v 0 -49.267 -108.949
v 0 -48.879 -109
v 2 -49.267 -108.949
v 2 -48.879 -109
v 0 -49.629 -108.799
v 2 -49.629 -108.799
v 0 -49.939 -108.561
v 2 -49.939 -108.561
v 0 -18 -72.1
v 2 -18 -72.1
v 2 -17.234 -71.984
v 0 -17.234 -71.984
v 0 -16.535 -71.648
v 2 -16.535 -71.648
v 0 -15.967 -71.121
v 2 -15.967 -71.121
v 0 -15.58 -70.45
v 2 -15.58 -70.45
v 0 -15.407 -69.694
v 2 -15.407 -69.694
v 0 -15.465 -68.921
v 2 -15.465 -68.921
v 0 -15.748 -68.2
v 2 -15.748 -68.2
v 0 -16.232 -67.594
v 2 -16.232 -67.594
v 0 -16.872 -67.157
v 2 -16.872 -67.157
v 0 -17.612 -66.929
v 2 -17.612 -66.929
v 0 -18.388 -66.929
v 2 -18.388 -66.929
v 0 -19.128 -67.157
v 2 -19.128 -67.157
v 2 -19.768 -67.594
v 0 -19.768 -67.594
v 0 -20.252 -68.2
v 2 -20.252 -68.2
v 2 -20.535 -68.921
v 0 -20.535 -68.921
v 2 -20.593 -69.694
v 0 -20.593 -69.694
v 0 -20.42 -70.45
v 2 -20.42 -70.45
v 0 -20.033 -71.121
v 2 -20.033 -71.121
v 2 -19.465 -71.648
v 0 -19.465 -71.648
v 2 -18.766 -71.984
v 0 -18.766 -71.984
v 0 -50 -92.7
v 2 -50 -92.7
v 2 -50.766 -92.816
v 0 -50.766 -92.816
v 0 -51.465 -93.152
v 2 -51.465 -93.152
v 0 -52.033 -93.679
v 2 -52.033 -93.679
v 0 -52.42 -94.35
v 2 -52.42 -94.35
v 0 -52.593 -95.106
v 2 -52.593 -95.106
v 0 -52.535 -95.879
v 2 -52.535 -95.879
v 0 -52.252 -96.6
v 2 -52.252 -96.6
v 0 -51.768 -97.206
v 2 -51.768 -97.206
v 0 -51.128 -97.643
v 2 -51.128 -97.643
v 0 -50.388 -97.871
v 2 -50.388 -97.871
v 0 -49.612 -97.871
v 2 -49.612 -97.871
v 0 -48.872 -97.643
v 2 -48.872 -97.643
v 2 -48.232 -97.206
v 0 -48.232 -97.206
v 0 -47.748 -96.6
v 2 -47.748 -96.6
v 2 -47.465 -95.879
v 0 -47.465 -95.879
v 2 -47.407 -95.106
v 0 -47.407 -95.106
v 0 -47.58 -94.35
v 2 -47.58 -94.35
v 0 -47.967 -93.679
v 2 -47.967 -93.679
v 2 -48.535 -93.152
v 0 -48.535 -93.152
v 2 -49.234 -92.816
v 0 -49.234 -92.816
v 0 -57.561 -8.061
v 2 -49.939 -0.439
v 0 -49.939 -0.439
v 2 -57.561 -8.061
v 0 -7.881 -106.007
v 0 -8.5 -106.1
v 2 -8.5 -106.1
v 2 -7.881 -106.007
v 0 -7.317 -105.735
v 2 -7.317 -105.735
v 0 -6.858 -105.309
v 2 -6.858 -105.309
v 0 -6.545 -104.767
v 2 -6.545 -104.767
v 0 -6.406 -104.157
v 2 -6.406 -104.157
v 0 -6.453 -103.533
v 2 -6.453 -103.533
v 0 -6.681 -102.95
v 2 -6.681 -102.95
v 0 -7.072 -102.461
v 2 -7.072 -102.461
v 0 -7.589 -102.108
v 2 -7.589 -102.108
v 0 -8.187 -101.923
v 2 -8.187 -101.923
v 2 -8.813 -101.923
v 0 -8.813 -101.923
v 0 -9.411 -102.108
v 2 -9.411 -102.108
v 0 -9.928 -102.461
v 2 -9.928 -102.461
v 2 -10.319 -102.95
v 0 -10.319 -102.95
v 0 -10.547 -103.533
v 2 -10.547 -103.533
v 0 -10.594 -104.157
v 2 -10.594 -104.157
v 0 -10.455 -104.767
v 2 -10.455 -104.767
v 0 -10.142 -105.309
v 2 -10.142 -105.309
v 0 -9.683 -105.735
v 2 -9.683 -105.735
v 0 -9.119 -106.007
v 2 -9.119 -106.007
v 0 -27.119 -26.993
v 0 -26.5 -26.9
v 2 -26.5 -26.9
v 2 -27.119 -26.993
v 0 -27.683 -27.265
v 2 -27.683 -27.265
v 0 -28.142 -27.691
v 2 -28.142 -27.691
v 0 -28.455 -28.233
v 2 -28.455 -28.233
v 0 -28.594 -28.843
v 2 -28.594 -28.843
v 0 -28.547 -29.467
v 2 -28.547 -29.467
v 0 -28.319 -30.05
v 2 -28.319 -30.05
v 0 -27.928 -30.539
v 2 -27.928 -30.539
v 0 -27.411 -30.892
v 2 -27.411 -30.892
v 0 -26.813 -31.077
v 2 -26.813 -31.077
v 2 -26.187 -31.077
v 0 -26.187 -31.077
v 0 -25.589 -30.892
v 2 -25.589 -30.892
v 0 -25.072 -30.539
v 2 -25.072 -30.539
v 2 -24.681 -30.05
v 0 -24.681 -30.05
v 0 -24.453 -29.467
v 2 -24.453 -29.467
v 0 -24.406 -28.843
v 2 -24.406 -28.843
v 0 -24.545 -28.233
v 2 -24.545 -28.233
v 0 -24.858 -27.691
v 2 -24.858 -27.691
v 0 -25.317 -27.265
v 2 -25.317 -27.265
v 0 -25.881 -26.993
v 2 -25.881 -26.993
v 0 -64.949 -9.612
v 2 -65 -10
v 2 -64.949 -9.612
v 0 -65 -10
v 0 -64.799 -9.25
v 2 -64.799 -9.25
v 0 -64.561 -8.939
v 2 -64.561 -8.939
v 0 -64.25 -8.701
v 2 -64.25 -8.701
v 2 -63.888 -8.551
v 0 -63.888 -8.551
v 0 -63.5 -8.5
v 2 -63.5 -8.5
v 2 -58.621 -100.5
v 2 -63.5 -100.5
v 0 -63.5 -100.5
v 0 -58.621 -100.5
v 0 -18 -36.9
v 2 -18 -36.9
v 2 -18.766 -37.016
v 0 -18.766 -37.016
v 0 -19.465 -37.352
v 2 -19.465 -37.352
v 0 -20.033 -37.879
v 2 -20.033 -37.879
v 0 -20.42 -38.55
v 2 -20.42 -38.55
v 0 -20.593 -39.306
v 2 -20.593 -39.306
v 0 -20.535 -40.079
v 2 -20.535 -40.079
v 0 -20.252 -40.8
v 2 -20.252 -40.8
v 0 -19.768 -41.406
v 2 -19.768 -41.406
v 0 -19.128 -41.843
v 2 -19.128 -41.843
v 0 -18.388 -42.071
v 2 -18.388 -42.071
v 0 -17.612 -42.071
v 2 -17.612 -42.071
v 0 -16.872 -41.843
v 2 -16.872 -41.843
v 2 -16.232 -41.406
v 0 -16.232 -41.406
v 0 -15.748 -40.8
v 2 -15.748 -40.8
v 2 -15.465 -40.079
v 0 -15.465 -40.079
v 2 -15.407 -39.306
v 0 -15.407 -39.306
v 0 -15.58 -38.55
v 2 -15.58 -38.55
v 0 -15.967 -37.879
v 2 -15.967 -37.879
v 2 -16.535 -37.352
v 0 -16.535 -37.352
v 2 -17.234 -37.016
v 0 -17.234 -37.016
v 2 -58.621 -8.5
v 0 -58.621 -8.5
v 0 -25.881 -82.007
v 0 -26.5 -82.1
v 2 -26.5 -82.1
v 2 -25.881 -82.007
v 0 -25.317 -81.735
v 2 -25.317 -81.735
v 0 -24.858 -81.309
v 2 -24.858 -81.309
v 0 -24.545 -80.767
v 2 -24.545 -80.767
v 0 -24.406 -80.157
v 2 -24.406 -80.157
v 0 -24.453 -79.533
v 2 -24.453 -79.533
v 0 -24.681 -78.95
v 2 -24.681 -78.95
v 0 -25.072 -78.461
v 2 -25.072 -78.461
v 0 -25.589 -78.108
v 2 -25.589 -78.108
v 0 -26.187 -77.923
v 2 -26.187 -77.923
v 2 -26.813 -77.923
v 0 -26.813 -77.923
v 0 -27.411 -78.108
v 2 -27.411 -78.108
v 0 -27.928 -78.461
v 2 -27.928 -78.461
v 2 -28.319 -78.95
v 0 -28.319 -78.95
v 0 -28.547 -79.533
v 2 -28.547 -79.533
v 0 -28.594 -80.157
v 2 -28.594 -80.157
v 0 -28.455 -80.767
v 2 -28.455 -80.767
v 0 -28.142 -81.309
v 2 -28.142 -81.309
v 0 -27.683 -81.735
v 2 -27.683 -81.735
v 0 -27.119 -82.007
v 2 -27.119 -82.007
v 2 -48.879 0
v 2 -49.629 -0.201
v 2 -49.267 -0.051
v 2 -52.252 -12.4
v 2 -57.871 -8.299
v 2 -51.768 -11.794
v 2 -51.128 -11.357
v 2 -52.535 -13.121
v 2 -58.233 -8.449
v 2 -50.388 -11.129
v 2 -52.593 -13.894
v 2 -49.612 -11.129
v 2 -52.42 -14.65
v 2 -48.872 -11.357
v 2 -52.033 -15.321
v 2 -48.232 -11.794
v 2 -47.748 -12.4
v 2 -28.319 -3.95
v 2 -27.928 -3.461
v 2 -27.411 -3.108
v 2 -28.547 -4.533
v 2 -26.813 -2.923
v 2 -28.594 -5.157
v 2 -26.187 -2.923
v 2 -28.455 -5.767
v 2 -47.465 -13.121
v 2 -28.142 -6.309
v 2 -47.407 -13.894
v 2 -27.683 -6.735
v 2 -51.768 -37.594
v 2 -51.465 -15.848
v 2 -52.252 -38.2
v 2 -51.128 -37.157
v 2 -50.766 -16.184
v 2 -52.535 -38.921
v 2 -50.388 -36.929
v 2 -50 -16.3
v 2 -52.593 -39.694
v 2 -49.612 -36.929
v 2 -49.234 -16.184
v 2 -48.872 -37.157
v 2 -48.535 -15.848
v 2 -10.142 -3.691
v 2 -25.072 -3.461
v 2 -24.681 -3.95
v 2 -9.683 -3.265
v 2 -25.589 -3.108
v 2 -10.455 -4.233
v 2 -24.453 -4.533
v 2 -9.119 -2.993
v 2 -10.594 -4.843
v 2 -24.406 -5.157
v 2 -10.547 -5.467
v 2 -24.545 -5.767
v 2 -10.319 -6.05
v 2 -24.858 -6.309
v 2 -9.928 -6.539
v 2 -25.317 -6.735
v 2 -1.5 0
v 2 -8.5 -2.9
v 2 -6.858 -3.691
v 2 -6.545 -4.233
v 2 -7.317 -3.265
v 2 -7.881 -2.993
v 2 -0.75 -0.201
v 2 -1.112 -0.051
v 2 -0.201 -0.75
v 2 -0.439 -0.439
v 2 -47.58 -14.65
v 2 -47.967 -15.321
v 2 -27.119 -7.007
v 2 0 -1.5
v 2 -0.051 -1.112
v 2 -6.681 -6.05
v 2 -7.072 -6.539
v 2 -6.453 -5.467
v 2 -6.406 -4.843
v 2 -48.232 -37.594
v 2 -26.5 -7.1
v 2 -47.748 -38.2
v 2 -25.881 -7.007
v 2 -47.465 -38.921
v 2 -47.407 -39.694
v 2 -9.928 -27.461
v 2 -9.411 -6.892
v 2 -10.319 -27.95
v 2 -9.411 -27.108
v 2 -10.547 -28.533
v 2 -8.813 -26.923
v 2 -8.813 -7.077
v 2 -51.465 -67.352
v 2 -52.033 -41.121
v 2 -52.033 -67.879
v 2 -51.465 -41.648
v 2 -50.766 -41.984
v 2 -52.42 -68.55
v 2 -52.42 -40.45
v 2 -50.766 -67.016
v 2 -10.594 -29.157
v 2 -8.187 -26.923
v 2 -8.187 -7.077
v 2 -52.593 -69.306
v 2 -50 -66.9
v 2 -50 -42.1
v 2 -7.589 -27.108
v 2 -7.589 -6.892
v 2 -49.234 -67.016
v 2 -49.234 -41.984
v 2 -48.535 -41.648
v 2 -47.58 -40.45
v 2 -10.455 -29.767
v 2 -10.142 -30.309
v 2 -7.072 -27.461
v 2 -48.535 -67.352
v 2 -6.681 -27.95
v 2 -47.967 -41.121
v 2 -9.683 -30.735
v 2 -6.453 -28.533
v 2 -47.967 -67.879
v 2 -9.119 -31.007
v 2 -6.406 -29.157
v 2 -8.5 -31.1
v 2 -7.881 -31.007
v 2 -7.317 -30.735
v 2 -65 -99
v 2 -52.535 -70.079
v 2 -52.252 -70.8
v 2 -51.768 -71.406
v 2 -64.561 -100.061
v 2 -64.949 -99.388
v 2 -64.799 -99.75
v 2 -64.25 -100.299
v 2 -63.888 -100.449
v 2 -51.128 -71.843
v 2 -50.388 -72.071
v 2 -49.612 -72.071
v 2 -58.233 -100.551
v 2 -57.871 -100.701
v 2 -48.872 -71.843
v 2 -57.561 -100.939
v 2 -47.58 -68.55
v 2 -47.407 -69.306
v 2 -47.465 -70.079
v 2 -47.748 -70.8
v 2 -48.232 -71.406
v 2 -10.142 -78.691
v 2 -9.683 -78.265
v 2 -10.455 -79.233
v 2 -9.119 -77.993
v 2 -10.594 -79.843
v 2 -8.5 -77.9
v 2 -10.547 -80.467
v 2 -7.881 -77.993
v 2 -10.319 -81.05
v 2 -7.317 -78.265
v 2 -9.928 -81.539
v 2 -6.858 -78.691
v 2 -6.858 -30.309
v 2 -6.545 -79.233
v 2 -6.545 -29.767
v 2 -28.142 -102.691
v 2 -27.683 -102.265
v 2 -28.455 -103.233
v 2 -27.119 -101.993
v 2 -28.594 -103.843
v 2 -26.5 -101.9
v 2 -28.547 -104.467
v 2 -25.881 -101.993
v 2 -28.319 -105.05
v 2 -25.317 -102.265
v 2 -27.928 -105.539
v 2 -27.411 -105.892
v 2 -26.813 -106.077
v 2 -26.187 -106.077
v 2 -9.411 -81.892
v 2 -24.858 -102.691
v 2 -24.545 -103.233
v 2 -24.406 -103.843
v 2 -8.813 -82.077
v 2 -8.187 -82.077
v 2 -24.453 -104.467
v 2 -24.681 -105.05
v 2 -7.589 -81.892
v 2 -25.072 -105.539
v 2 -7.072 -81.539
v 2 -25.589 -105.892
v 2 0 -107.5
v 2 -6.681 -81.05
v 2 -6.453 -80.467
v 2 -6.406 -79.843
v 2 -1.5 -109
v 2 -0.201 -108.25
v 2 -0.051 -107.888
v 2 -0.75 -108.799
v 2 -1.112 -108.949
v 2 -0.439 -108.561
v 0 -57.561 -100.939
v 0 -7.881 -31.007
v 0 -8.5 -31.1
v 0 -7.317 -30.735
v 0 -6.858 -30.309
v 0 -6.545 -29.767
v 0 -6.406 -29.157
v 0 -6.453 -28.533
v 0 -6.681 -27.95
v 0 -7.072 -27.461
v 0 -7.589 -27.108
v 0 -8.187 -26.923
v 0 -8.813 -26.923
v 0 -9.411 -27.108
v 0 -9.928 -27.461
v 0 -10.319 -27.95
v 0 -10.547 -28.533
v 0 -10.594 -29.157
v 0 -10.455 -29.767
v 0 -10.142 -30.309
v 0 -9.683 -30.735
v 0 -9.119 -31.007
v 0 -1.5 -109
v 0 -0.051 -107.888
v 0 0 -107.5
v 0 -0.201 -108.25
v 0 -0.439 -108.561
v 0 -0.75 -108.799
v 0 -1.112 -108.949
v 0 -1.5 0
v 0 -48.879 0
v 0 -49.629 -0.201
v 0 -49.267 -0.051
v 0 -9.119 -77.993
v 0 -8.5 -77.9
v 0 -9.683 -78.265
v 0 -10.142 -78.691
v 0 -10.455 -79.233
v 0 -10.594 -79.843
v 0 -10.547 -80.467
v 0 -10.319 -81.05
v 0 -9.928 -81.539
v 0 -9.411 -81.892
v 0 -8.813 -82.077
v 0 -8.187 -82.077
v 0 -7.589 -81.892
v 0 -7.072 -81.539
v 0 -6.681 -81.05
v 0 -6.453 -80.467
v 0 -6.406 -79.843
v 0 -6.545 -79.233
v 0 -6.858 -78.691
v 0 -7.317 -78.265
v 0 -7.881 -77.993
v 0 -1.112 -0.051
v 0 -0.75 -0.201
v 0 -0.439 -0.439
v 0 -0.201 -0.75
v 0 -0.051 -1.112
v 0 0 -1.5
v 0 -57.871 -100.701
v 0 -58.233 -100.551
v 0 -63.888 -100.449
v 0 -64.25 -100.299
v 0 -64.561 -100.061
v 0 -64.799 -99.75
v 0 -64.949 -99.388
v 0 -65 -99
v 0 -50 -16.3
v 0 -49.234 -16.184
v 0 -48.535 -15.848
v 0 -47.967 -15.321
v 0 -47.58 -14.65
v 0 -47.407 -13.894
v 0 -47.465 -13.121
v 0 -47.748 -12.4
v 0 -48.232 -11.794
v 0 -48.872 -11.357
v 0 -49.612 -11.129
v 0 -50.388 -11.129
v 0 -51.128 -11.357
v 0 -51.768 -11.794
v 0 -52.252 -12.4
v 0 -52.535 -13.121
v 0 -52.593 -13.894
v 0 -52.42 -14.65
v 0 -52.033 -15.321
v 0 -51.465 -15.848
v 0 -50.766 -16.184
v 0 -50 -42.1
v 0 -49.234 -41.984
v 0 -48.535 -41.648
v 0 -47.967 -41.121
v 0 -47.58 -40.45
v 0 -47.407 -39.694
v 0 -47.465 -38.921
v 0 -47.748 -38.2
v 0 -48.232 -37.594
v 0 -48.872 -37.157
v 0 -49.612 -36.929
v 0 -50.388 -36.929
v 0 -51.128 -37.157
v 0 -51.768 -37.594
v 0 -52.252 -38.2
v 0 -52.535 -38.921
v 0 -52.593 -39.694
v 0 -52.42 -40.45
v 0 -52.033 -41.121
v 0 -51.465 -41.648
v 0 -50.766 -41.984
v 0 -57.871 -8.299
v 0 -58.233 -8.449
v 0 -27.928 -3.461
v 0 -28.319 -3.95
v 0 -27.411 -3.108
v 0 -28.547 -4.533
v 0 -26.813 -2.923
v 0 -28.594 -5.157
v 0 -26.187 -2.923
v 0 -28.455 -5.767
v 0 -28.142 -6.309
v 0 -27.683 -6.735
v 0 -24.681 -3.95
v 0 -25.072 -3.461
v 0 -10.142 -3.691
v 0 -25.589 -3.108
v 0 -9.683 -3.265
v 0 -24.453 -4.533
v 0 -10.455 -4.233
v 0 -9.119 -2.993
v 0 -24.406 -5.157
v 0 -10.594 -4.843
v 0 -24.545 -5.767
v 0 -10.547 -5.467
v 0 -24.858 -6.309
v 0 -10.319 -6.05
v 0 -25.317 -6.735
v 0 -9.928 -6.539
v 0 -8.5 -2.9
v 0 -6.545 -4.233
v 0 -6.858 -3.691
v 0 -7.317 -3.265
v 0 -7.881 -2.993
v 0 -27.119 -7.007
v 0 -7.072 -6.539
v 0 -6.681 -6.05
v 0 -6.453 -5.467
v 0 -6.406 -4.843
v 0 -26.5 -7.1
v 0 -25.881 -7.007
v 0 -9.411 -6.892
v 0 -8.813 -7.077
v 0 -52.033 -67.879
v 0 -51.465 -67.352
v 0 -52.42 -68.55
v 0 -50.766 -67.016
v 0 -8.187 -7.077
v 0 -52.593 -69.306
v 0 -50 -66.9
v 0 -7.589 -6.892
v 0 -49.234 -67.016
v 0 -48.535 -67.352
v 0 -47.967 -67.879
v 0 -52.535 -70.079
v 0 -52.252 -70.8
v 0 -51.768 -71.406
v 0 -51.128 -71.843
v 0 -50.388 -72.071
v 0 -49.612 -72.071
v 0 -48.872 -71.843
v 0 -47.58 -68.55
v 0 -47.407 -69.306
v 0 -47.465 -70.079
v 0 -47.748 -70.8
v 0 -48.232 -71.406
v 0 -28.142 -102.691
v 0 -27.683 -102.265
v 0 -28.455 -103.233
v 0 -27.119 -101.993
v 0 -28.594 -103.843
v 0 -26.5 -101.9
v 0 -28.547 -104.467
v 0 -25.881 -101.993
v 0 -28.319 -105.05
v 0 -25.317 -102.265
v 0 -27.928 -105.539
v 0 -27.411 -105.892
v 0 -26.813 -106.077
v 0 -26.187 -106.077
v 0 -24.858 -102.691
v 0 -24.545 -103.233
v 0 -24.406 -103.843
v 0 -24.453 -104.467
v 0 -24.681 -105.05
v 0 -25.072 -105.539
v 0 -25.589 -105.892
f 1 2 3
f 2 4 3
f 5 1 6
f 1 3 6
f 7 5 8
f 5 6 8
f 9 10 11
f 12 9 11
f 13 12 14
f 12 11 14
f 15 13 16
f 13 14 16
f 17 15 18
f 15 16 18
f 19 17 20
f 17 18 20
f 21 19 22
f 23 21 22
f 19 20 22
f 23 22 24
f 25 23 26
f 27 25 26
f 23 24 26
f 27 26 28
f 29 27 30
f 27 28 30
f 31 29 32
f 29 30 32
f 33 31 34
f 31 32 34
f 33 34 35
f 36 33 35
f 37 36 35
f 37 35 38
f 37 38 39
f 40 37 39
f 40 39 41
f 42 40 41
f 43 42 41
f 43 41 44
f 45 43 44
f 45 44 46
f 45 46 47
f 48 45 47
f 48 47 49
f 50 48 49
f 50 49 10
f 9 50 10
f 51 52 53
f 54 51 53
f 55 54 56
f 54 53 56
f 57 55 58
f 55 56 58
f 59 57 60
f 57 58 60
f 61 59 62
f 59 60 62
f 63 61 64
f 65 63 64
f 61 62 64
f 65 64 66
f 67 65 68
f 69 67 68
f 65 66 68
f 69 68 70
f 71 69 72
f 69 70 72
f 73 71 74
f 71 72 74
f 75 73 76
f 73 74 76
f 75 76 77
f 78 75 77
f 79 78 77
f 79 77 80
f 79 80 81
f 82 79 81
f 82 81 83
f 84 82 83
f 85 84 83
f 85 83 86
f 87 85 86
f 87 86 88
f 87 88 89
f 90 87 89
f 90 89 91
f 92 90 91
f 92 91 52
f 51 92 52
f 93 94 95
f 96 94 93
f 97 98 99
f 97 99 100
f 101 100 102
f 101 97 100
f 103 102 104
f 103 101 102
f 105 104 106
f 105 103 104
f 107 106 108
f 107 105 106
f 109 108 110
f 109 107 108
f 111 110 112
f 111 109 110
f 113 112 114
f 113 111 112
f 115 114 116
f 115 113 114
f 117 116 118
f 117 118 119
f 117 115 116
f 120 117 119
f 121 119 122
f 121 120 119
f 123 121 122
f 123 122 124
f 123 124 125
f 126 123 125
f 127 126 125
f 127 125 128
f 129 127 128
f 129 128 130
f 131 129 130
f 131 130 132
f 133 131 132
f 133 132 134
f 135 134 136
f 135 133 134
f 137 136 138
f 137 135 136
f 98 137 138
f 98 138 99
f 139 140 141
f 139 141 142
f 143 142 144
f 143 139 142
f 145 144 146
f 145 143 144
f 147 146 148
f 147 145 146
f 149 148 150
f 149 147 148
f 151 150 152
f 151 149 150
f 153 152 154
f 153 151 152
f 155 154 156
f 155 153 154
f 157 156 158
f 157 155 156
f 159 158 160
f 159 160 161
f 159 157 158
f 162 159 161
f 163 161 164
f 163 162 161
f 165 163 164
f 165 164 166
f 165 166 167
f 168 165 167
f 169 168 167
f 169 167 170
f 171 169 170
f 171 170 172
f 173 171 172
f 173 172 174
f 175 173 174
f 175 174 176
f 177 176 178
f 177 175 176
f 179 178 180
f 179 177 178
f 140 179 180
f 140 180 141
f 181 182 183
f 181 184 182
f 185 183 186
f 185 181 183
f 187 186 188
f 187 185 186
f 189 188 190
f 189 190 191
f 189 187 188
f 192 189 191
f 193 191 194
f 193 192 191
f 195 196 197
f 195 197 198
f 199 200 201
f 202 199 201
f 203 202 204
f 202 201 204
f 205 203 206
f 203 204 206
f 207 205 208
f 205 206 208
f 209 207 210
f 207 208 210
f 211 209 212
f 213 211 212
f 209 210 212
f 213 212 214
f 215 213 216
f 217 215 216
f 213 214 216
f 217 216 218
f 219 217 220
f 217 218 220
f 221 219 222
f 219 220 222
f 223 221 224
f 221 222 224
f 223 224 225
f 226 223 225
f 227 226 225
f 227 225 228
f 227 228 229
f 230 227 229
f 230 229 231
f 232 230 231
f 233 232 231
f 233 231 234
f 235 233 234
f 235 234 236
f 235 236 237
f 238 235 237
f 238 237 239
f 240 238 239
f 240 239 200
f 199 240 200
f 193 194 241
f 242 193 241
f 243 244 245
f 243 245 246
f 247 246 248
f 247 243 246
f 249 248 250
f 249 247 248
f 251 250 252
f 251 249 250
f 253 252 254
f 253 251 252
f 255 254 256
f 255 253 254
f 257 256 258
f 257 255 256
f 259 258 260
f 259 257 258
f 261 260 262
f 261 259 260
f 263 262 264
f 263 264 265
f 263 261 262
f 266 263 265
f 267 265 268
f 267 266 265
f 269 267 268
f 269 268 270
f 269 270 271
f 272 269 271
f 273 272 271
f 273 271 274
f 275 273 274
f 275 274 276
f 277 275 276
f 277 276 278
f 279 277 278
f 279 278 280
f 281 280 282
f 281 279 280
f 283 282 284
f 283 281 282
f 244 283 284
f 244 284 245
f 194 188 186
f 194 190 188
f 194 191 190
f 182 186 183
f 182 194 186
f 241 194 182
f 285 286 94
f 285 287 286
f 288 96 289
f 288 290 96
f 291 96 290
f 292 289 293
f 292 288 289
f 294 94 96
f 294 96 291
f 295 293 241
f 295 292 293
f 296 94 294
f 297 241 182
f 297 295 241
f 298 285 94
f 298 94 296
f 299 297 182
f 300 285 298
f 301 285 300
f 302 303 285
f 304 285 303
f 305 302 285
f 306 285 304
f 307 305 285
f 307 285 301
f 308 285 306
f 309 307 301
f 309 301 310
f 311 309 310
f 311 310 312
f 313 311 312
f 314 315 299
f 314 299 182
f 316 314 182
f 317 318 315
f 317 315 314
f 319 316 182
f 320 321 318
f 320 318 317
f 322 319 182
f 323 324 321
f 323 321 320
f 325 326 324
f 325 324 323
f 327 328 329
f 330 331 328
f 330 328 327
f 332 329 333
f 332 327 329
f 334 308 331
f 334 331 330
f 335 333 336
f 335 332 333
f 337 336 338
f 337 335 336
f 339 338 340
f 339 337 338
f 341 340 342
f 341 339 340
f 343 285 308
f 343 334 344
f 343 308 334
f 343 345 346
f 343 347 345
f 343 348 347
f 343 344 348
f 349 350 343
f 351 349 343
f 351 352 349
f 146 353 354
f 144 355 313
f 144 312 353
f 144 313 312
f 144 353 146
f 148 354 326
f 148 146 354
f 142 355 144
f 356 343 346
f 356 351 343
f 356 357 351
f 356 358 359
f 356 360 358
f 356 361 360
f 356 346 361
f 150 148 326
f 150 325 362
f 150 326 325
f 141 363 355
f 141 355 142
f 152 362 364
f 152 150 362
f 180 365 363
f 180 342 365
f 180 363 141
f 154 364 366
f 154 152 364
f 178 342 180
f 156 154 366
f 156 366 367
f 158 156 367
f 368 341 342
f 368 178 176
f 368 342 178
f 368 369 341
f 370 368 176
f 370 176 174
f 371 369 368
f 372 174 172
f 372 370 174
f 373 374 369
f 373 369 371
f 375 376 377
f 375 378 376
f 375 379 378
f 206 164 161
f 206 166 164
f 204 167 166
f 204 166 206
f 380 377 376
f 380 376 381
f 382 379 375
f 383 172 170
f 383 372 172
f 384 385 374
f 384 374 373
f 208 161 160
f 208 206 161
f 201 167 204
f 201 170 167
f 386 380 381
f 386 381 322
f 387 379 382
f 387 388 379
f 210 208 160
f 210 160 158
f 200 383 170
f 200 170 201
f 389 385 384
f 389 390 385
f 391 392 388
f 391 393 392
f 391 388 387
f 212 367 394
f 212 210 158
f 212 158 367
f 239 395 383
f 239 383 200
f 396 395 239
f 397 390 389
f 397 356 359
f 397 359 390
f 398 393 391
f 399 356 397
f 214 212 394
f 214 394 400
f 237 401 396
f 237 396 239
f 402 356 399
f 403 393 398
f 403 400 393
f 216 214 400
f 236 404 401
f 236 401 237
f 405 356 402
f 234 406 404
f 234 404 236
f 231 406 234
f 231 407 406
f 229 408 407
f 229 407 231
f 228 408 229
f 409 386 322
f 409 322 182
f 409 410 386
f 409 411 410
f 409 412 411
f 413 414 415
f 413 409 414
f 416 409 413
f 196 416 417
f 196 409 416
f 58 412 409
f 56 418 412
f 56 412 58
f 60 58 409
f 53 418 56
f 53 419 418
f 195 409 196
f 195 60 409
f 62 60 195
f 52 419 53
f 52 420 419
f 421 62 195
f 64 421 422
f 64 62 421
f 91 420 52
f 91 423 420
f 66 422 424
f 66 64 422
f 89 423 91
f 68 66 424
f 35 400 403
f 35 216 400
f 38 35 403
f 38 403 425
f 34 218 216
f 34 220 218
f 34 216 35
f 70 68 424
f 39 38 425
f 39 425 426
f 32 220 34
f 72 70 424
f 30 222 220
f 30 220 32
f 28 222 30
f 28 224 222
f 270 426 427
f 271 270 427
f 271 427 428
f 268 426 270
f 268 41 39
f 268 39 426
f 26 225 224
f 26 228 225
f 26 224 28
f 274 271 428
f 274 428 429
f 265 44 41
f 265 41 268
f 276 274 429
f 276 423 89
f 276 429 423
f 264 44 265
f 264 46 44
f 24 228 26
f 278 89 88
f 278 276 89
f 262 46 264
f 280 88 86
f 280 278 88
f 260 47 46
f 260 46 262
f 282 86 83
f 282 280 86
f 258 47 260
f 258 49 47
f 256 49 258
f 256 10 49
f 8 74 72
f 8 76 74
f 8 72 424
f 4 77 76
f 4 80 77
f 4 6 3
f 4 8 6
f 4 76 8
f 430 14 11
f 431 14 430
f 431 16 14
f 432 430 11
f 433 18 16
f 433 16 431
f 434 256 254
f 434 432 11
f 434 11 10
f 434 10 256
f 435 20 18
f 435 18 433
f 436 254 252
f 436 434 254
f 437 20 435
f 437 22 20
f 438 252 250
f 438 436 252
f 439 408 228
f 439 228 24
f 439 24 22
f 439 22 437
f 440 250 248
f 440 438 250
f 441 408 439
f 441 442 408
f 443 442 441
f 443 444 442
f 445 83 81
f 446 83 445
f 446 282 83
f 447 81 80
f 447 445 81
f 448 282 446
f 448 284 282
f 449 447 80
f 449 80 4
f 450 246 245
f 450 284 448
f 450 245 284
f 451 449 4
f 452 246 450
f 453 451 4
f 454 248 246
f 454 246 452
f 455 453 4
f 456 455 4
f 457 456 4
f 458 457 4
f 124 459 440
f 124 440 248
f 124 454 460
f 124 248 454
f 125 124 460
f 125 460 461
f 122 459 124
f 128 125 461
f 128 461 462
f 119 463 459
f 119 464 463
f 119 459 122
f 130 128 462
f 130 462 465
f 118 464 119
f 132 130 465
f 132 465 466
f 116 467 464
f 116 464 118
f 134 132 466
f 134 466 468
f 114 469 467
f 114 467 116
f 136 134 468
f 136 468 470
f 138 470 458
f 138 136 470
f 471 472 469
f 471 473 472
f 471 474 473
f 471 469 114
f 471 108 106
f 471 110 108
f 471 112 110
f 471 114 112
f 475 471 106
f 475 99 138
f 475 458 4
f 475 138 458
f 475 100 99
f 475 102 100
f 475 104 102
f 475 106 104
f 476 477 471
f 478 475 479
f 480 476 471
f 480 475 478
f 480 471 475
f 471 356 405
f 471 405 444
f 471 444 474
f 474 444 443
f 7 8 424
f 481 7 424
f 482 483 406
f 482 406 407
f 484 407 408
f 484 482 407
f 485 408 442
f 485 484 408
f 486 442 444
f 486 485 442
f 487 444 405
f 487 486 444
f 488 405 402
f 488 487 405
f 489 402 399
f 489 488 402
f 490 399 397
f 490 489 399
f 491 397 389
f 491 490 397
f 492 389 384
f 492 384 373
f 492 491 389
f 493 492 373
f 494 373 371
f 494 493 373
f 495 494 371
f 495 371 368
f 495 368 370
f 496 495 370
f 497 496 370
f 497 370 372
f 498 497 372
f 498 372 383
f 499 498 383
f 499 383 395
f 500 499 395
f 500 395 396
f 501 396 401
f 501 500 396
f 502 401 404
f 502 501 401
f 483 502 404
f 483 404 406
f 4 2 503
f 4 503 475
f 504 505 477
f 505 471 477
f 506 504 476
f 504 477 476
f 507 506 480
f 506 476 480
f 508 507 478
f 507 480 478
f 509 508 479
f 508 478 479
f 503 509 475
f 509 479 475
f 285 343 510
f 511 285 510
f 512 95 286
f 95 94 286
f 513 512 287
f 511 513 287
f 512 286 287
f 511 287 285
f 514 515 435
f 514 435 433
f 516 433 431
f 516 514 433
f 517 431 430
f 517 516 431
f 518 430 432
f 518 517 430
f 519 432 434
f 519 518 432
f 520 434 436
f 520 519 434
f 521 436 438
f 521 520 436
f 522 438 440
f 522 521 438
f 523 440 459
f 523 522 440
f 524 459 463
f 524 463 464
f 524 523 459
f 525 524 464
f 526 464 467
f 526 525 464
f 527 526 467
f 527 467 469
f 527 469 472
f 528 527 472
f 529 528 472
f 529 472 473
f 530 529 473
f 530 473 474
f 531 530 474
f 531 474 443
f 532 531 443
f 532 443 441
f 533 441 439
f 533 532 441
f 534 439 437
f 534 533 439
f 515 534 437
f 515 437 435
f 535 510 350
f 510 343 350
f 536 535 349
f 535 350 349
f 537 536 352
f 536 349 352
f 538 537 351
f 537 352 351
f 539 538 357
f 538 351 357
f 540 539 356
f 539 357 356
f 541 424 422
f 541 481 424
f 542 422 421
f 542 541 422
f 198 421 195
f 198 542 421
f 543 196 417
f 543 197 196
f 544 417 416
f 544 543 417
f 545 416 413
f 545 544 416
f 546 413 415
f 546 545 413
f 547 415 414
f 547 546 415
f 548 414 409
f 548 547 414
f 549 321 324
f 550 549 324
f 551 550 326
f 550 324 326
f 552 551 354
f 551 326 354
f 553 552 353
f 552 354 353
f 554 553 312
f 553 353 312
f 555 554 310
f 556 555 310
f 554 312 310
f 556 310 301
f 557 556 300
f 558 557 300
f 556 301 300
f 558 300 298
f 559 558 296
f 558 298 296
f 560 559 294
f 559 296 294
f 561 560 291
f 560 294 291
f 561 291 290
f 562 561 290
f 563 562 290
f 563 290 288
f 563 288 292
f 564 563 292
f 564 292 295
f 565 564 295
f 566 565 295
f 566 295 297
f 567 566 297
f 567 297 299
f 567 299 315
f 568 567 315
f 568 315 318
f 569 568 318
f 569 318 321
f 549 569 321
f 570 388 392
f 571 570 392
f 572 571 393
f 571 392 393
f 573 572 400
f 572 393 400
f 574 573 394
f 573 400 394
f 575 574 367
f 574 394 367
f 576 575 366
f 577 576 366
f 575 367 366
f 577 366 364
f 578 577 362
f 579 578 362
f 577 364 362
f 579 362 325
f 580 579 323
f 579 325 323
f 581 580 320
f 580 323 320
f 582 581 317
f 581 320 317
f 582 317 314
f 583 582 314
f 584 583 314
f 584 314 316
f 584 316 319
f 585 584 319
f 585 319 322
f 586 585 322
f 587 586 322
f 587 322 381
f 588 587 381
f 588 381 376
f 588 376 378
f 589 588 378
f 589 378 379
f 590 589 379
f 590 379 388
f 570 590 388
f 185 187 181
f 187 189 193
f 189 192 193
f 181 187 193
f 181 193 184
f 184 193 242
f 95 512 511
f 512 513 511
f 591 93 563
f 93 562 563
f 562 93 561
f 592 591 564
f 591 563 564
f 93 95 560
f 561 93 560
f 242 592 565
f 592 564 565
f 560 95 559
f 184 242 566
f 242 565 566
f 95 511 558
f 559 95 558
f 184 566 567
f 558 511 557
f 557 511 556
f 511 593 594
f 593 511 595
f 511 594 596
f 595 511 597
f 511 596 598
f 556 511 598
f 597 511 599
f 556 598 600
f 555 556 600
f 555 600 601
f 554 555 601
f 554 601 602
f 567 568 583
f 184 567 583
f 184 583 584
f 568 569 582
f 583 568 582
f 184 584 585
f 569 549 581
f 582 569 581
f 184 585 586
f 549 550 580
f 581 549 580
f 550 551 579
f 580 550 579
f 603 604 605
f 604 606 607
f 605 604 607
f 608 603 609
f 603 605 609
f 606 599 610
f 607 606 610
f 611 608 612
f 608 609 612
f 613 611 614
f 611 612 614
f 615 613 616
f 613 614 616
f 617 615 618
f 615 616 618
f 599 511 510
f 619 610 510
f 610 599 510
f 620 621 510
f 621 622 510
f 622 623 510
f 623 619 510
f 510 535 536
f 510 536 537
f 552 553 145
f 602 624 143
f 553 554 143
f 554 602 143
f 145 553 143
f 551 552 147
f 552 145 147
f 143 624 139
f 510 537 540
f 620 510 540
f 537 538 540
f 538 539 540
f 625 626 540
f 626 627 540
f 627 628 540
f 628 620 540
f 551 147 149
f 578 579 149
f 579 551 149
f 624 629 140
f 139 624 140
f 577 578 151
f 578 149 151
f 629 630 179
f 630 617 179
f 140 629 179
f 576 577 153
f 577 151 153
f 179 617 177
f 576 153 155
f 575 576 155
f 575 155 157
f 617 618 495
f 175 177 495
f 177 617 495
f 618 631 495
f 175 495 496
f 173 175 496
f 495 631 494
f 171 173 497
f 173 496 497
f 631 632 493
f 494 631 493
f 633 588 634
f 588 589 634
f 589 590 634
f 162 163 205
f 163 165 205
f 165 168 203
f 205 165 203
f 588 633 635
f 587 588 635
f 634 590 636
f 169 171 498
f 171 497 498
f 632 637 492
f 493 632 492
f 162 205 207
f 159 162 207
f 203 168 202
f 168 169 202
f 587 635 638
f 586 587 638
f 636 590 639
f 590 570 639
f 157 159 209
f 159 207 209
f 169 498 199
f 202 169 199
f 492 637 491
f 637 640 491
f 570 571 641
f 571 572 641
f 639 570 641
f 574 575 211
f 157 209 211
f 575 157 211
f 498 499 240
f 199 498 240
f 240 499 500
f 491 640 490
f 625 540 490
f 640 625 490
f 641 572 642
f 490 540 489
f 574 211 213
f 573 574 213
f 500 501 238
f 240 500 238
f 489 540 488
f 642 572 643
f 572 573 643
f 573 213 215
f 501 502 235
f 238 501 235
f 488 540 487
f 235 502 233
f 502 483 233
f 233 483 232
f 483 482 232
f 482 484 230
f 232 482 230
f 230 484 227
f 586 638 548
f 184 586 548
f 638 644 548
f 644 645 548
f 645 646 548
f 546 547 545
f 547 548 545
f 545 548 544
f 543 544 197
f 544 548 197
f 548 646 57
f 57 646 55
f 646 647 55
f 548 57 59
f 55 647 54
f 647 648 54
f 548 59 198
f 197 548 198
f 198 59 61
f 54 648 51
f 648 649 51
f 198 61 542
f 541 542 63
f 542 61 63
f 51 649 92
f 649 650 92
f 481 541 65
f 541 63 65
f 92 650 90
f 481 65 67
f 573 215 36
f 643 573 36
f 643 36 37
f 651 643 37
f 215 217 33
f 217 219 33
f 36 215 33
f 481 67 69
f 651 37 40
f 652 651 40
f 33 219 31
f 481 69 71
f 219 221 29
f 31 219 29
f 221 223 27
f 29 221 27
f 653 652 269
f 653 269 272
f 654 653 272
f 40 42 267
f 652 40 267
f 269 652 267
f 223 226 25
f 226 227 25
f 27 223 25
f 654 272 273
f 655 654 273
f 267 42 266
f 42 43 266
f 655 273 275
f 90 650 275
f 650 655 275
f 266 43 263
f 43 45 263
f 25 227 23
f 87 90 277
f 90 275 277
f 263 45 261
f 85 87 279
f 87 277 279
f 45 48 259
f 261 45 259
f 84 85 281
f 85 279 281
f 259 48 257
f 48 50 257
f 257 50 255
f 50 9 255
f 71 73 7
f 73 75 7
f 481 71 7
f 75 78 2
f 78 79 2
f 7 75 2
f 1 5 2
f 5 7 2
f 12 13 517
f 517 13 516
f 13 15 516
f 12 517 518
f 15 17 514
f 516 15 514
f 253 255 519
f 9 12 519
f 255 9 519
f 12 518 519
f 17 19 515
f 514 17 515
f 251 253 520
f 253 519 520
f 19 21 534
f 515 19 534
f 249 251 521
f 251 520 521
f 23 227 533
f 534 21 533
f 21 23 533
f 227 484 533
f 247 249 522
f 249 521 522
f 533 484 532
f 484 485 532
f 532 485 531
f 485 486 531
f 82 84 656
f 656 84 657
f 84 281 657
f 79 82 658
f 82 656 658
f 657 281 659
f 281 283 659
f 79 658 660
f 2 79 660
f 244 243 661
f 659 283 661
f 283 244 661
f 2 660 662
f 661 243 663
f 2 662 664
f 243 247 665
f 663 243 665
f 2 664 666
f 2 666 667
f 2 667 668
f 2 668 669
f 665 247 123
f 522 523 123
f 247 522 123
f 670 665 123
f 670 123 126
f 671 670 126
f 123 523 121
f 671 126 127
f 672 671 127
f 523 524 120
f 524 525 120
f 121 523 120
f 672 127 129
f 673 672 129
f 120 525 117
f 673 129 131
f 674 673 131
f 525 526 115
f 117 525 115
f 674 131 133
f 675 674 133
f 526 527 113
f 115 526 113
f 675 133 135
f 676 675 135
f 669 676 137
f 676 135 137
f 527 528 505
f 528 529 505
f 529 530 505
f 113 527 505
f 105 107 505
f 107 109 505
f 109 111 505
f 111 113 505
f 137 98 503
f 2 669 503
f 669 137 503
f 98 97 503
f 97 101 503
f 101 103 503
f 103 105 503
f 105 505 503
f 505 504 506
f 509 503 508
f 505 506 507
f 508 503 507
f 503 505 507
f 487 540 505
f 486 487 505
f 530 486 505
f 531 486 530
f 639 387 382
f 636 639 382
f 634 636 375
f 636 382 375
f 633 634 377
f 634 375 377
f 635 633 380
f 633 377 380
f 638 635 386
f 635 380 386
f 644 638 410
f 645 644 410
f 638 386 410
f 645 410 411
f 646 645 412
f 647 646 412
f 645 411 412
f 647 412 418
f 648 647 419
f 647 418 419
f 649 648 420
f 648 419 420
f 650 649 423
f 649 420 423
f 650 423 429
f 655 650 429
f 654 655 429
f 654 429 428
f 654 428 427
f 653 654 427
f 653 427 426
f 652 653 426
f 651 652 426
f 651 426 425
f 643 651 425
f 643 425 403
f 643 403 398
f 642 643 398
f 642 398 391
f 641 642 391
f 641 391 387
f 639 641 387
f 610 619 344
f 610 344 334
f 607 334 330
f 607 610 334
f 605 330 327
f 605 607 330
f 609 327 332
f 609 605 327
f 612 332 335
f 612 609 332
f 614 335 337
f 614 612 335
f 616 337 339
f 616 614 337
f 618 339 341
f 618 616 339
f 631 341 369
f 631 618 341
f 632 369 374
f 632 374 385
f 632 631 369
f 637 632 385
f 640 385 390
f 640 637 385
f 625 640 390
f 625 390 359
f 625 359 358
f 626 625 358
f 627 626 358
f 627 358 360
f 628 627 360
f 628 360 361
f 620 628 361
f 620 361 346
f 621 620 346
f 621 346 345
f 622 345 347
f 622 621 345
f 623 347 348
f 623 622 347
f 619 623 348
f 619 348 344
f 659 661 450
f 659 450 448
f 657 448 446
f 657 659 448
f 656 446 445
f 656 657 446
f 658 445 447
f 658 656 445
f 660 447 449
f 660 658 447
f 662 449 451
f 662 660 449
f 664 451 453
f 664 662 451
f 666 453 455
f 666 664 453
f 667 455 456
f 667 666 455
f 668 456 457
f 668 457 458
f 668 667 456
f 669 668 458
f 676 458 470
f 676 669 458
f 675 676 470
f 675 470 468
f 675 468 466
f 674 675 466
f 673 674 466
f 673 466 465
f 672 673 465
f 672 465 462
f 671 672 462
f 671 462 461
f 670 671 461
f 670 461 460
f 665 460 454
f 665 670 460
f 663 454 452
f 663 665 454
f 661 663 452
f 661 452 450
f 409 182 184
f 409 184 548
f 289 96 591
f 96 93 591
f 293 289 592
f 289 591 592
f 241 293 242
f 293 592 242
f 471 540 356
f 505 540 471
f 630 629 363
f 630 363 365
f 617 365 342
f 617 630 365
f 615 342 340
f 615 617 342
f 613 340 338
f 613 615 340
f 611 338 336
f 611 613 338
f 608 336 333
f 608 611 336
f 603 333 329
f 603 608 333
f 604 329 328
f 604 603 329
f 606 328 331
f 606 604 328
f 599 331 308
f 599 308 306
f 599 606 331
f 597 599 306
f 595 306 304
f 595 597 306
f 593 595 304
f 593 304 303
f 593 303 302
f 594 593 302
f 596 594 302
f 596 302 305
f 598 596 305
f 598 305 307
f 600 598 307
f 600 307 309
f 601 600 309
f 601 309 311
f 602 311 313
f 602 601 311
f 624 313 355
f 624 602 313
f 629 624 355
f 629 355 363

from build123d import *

# Parameters (mm, degrees)
SKETCH1_W           = 109
SKETCH1_H           = 35
SKETCH1_R           = 2.1
BOSS_EXTRUDE1_DEPTH = 2
SKETCH2_W           = 92
SKETCH2_H           = 30
BOSS_EXTRUDE2_DEPTH = 2
SKETCH3_R           = 2.6
CUT_EXTRUDE1_DEPTH  = 127.925174808
CHAMFER1_SIZE       = 23
FILLET1_R           = 1.5


with BuildPart() as part:
    # Sketch1 → Boss-Extrude1 (new body)
    with BuildSketch(Plane(origin=(0, 0, 0), x_dir=(0, 0, -1), z_dir=(1, 0, 0))):
        with Locations((54.5, -17.5)):
            Rectangle(SKETCH1_W, SKETCH1_H)
        with Locations((104, -8.5)):
            Circle(SKETCH1_R, mode=Mode.SUBTRACT)
        with Locations(Location((104, -26.5, 0), (0, 0, 180))):
            Circle(SKETCH1_R, mode=Mode.SUBTRACT)
        with Locations((80, -26.5)):
            Circle(SKETCH1_R, mode=Mode.SUBTRACT)
        with Locations(Location((80, -8.5, 0), (0, 0, 180))):
            Circle(SKETCH1_R, mode=Mode.SUBTRACT)
        with Locations((5, -26.5)):
            Circle(SKETCH1_R, mode=Mode.SUBTRACT)
        with Locations(Location((5, -8.5, 0), (0, 0, 180))):
            Circle(SKETCH1_R, mode=Mode.SUBTRACT)
        with Locations(Location((29, -26.5, 0), (0, 0, 180))):
            Circle(SKETCH1_R, mode=Mode.SUBTRACT)
        with Locations((29, -8.5)):
            Circle(SKETCH1_R, mode=Mode.SUBTRACT)
    extrude(amount=BOSS_EXTRUDE1_DEPTH)

    # Sketch2 → Boss-Extrude2 (add)
    with BuildSketch(Plane(origin=(2, 0, 0), x_dir=(0, 0, -1), z_dir=(1, 0, 0))):
        with Locations((54.5, -50)):
            Rectangle(SKETCH2_W, SKETCH2_H)
    extrude(amount=-BOSS_EXTRUDE2_DEPTH)

    # Sketch3 → Cut-Extrude1 (cut, through all)
    with BuildSketch(Plane(origin=(2, 0, 0), x_dir=(0, 0, -1), z_dir=(1, 0, 0))):
        with Locations((13.7, -50)):
            Circle(SKETCH3_R)
        with Locations((39.5, -50)):
            Circle(SKETCH3_R)
        with Locations(Location((95.3, -50, 0), (0, 0, 180))):
            Circle(SKETCH3_R)
        with Locations(Location((69.5, -50, 0), (0, 0, 180))):
            Circle(SKETCH3_R)
        with Locations((69.5, -18)):
            Circle(SKETCH3_R)
        with Locations(Location((39.5, -18, 0), (0, 0, 180))):
            Circle(SKETCH3_R)
    extrude(amount=-CUT_EXTRUDE1_DEPTH, mode=Mode.SUBTRACT)

    # Chamfer1
    # the kernel refuses this chamfer: 23 mm, written as the material it adds along each edge
    with BuildSketch(Plane(origin=(2, -35, -100.5), x_dir=(0, 0.027495876610586077, -0.9996219169112968), z_dir=(-1, 0, 0))) as chamfer1_piece_1_section:
        Polygon((CHAMFER1_SIZE * 0.999621916911, CHAMFER1_SIZE * 0.0274958766106), (-CHAMFER1_SIZE * 0.0274958766106, CHAMFER1_SIZE * 0.999621916911), (0, 0), align=None)
    chamfer1_piece_1 = extrude(amount=2, mode=Mode.PRIVATE)
    chamfer1_piece_1 = split(chamfer1_piece_1, bisect_by=Plane(origin=(1, -44.672301489, -109), z_dir=(0, 0, 1)), keep=Keep.TOP, mode=Mode.PRIVATE)
    add(chamfer1_piece_1)
    with BuildSketch(Plane(origin=(2, -35, -8.5), x_dir=(0, 0.02749587661058667, 0.9996219169112968), z_dir=(-1, 0, 0))) as chamfer1_piece_2_section:
        Polygon((CHAMFER1_SIZE * 0.999621916911, -CHAMFER1_SIZE * 0.0274958766106), (-CHAMFER1_SIZE * 0.0274958766106, -CHAMFER1_SIZE * 0.999621916911), (0, 0), align=None)
    chamfer1_piece_2 = extrude(amount=2, mode=Mode.PRIVATE)
    chamfer1_piece_2 = split(chamfer1_piece_2, bisect_by=Plane(origin=(1, -44.672301489, 0), z_dir=(0, 0, -1)), keep=Keep.TOP, mode=Mode.PRIVATE)
    add(chamfer1_piece_2)

    # Fillet1
    fillet1_edges = [part.edges().sort_by_distance(p)[0] for p in [
        (1, -65, -8.5),
        (1, -65, -100.5),
        (1, 0, 0),
        (1, 0, -109),
        (1, -58, -8.5),
        (1, -58, -100.5),
        (1, -49.5, 0),
        (1, -49.5, -109),
    ]]
    fillet(fillet1_edges, radius=FILLET1_R)


solid = part.part
